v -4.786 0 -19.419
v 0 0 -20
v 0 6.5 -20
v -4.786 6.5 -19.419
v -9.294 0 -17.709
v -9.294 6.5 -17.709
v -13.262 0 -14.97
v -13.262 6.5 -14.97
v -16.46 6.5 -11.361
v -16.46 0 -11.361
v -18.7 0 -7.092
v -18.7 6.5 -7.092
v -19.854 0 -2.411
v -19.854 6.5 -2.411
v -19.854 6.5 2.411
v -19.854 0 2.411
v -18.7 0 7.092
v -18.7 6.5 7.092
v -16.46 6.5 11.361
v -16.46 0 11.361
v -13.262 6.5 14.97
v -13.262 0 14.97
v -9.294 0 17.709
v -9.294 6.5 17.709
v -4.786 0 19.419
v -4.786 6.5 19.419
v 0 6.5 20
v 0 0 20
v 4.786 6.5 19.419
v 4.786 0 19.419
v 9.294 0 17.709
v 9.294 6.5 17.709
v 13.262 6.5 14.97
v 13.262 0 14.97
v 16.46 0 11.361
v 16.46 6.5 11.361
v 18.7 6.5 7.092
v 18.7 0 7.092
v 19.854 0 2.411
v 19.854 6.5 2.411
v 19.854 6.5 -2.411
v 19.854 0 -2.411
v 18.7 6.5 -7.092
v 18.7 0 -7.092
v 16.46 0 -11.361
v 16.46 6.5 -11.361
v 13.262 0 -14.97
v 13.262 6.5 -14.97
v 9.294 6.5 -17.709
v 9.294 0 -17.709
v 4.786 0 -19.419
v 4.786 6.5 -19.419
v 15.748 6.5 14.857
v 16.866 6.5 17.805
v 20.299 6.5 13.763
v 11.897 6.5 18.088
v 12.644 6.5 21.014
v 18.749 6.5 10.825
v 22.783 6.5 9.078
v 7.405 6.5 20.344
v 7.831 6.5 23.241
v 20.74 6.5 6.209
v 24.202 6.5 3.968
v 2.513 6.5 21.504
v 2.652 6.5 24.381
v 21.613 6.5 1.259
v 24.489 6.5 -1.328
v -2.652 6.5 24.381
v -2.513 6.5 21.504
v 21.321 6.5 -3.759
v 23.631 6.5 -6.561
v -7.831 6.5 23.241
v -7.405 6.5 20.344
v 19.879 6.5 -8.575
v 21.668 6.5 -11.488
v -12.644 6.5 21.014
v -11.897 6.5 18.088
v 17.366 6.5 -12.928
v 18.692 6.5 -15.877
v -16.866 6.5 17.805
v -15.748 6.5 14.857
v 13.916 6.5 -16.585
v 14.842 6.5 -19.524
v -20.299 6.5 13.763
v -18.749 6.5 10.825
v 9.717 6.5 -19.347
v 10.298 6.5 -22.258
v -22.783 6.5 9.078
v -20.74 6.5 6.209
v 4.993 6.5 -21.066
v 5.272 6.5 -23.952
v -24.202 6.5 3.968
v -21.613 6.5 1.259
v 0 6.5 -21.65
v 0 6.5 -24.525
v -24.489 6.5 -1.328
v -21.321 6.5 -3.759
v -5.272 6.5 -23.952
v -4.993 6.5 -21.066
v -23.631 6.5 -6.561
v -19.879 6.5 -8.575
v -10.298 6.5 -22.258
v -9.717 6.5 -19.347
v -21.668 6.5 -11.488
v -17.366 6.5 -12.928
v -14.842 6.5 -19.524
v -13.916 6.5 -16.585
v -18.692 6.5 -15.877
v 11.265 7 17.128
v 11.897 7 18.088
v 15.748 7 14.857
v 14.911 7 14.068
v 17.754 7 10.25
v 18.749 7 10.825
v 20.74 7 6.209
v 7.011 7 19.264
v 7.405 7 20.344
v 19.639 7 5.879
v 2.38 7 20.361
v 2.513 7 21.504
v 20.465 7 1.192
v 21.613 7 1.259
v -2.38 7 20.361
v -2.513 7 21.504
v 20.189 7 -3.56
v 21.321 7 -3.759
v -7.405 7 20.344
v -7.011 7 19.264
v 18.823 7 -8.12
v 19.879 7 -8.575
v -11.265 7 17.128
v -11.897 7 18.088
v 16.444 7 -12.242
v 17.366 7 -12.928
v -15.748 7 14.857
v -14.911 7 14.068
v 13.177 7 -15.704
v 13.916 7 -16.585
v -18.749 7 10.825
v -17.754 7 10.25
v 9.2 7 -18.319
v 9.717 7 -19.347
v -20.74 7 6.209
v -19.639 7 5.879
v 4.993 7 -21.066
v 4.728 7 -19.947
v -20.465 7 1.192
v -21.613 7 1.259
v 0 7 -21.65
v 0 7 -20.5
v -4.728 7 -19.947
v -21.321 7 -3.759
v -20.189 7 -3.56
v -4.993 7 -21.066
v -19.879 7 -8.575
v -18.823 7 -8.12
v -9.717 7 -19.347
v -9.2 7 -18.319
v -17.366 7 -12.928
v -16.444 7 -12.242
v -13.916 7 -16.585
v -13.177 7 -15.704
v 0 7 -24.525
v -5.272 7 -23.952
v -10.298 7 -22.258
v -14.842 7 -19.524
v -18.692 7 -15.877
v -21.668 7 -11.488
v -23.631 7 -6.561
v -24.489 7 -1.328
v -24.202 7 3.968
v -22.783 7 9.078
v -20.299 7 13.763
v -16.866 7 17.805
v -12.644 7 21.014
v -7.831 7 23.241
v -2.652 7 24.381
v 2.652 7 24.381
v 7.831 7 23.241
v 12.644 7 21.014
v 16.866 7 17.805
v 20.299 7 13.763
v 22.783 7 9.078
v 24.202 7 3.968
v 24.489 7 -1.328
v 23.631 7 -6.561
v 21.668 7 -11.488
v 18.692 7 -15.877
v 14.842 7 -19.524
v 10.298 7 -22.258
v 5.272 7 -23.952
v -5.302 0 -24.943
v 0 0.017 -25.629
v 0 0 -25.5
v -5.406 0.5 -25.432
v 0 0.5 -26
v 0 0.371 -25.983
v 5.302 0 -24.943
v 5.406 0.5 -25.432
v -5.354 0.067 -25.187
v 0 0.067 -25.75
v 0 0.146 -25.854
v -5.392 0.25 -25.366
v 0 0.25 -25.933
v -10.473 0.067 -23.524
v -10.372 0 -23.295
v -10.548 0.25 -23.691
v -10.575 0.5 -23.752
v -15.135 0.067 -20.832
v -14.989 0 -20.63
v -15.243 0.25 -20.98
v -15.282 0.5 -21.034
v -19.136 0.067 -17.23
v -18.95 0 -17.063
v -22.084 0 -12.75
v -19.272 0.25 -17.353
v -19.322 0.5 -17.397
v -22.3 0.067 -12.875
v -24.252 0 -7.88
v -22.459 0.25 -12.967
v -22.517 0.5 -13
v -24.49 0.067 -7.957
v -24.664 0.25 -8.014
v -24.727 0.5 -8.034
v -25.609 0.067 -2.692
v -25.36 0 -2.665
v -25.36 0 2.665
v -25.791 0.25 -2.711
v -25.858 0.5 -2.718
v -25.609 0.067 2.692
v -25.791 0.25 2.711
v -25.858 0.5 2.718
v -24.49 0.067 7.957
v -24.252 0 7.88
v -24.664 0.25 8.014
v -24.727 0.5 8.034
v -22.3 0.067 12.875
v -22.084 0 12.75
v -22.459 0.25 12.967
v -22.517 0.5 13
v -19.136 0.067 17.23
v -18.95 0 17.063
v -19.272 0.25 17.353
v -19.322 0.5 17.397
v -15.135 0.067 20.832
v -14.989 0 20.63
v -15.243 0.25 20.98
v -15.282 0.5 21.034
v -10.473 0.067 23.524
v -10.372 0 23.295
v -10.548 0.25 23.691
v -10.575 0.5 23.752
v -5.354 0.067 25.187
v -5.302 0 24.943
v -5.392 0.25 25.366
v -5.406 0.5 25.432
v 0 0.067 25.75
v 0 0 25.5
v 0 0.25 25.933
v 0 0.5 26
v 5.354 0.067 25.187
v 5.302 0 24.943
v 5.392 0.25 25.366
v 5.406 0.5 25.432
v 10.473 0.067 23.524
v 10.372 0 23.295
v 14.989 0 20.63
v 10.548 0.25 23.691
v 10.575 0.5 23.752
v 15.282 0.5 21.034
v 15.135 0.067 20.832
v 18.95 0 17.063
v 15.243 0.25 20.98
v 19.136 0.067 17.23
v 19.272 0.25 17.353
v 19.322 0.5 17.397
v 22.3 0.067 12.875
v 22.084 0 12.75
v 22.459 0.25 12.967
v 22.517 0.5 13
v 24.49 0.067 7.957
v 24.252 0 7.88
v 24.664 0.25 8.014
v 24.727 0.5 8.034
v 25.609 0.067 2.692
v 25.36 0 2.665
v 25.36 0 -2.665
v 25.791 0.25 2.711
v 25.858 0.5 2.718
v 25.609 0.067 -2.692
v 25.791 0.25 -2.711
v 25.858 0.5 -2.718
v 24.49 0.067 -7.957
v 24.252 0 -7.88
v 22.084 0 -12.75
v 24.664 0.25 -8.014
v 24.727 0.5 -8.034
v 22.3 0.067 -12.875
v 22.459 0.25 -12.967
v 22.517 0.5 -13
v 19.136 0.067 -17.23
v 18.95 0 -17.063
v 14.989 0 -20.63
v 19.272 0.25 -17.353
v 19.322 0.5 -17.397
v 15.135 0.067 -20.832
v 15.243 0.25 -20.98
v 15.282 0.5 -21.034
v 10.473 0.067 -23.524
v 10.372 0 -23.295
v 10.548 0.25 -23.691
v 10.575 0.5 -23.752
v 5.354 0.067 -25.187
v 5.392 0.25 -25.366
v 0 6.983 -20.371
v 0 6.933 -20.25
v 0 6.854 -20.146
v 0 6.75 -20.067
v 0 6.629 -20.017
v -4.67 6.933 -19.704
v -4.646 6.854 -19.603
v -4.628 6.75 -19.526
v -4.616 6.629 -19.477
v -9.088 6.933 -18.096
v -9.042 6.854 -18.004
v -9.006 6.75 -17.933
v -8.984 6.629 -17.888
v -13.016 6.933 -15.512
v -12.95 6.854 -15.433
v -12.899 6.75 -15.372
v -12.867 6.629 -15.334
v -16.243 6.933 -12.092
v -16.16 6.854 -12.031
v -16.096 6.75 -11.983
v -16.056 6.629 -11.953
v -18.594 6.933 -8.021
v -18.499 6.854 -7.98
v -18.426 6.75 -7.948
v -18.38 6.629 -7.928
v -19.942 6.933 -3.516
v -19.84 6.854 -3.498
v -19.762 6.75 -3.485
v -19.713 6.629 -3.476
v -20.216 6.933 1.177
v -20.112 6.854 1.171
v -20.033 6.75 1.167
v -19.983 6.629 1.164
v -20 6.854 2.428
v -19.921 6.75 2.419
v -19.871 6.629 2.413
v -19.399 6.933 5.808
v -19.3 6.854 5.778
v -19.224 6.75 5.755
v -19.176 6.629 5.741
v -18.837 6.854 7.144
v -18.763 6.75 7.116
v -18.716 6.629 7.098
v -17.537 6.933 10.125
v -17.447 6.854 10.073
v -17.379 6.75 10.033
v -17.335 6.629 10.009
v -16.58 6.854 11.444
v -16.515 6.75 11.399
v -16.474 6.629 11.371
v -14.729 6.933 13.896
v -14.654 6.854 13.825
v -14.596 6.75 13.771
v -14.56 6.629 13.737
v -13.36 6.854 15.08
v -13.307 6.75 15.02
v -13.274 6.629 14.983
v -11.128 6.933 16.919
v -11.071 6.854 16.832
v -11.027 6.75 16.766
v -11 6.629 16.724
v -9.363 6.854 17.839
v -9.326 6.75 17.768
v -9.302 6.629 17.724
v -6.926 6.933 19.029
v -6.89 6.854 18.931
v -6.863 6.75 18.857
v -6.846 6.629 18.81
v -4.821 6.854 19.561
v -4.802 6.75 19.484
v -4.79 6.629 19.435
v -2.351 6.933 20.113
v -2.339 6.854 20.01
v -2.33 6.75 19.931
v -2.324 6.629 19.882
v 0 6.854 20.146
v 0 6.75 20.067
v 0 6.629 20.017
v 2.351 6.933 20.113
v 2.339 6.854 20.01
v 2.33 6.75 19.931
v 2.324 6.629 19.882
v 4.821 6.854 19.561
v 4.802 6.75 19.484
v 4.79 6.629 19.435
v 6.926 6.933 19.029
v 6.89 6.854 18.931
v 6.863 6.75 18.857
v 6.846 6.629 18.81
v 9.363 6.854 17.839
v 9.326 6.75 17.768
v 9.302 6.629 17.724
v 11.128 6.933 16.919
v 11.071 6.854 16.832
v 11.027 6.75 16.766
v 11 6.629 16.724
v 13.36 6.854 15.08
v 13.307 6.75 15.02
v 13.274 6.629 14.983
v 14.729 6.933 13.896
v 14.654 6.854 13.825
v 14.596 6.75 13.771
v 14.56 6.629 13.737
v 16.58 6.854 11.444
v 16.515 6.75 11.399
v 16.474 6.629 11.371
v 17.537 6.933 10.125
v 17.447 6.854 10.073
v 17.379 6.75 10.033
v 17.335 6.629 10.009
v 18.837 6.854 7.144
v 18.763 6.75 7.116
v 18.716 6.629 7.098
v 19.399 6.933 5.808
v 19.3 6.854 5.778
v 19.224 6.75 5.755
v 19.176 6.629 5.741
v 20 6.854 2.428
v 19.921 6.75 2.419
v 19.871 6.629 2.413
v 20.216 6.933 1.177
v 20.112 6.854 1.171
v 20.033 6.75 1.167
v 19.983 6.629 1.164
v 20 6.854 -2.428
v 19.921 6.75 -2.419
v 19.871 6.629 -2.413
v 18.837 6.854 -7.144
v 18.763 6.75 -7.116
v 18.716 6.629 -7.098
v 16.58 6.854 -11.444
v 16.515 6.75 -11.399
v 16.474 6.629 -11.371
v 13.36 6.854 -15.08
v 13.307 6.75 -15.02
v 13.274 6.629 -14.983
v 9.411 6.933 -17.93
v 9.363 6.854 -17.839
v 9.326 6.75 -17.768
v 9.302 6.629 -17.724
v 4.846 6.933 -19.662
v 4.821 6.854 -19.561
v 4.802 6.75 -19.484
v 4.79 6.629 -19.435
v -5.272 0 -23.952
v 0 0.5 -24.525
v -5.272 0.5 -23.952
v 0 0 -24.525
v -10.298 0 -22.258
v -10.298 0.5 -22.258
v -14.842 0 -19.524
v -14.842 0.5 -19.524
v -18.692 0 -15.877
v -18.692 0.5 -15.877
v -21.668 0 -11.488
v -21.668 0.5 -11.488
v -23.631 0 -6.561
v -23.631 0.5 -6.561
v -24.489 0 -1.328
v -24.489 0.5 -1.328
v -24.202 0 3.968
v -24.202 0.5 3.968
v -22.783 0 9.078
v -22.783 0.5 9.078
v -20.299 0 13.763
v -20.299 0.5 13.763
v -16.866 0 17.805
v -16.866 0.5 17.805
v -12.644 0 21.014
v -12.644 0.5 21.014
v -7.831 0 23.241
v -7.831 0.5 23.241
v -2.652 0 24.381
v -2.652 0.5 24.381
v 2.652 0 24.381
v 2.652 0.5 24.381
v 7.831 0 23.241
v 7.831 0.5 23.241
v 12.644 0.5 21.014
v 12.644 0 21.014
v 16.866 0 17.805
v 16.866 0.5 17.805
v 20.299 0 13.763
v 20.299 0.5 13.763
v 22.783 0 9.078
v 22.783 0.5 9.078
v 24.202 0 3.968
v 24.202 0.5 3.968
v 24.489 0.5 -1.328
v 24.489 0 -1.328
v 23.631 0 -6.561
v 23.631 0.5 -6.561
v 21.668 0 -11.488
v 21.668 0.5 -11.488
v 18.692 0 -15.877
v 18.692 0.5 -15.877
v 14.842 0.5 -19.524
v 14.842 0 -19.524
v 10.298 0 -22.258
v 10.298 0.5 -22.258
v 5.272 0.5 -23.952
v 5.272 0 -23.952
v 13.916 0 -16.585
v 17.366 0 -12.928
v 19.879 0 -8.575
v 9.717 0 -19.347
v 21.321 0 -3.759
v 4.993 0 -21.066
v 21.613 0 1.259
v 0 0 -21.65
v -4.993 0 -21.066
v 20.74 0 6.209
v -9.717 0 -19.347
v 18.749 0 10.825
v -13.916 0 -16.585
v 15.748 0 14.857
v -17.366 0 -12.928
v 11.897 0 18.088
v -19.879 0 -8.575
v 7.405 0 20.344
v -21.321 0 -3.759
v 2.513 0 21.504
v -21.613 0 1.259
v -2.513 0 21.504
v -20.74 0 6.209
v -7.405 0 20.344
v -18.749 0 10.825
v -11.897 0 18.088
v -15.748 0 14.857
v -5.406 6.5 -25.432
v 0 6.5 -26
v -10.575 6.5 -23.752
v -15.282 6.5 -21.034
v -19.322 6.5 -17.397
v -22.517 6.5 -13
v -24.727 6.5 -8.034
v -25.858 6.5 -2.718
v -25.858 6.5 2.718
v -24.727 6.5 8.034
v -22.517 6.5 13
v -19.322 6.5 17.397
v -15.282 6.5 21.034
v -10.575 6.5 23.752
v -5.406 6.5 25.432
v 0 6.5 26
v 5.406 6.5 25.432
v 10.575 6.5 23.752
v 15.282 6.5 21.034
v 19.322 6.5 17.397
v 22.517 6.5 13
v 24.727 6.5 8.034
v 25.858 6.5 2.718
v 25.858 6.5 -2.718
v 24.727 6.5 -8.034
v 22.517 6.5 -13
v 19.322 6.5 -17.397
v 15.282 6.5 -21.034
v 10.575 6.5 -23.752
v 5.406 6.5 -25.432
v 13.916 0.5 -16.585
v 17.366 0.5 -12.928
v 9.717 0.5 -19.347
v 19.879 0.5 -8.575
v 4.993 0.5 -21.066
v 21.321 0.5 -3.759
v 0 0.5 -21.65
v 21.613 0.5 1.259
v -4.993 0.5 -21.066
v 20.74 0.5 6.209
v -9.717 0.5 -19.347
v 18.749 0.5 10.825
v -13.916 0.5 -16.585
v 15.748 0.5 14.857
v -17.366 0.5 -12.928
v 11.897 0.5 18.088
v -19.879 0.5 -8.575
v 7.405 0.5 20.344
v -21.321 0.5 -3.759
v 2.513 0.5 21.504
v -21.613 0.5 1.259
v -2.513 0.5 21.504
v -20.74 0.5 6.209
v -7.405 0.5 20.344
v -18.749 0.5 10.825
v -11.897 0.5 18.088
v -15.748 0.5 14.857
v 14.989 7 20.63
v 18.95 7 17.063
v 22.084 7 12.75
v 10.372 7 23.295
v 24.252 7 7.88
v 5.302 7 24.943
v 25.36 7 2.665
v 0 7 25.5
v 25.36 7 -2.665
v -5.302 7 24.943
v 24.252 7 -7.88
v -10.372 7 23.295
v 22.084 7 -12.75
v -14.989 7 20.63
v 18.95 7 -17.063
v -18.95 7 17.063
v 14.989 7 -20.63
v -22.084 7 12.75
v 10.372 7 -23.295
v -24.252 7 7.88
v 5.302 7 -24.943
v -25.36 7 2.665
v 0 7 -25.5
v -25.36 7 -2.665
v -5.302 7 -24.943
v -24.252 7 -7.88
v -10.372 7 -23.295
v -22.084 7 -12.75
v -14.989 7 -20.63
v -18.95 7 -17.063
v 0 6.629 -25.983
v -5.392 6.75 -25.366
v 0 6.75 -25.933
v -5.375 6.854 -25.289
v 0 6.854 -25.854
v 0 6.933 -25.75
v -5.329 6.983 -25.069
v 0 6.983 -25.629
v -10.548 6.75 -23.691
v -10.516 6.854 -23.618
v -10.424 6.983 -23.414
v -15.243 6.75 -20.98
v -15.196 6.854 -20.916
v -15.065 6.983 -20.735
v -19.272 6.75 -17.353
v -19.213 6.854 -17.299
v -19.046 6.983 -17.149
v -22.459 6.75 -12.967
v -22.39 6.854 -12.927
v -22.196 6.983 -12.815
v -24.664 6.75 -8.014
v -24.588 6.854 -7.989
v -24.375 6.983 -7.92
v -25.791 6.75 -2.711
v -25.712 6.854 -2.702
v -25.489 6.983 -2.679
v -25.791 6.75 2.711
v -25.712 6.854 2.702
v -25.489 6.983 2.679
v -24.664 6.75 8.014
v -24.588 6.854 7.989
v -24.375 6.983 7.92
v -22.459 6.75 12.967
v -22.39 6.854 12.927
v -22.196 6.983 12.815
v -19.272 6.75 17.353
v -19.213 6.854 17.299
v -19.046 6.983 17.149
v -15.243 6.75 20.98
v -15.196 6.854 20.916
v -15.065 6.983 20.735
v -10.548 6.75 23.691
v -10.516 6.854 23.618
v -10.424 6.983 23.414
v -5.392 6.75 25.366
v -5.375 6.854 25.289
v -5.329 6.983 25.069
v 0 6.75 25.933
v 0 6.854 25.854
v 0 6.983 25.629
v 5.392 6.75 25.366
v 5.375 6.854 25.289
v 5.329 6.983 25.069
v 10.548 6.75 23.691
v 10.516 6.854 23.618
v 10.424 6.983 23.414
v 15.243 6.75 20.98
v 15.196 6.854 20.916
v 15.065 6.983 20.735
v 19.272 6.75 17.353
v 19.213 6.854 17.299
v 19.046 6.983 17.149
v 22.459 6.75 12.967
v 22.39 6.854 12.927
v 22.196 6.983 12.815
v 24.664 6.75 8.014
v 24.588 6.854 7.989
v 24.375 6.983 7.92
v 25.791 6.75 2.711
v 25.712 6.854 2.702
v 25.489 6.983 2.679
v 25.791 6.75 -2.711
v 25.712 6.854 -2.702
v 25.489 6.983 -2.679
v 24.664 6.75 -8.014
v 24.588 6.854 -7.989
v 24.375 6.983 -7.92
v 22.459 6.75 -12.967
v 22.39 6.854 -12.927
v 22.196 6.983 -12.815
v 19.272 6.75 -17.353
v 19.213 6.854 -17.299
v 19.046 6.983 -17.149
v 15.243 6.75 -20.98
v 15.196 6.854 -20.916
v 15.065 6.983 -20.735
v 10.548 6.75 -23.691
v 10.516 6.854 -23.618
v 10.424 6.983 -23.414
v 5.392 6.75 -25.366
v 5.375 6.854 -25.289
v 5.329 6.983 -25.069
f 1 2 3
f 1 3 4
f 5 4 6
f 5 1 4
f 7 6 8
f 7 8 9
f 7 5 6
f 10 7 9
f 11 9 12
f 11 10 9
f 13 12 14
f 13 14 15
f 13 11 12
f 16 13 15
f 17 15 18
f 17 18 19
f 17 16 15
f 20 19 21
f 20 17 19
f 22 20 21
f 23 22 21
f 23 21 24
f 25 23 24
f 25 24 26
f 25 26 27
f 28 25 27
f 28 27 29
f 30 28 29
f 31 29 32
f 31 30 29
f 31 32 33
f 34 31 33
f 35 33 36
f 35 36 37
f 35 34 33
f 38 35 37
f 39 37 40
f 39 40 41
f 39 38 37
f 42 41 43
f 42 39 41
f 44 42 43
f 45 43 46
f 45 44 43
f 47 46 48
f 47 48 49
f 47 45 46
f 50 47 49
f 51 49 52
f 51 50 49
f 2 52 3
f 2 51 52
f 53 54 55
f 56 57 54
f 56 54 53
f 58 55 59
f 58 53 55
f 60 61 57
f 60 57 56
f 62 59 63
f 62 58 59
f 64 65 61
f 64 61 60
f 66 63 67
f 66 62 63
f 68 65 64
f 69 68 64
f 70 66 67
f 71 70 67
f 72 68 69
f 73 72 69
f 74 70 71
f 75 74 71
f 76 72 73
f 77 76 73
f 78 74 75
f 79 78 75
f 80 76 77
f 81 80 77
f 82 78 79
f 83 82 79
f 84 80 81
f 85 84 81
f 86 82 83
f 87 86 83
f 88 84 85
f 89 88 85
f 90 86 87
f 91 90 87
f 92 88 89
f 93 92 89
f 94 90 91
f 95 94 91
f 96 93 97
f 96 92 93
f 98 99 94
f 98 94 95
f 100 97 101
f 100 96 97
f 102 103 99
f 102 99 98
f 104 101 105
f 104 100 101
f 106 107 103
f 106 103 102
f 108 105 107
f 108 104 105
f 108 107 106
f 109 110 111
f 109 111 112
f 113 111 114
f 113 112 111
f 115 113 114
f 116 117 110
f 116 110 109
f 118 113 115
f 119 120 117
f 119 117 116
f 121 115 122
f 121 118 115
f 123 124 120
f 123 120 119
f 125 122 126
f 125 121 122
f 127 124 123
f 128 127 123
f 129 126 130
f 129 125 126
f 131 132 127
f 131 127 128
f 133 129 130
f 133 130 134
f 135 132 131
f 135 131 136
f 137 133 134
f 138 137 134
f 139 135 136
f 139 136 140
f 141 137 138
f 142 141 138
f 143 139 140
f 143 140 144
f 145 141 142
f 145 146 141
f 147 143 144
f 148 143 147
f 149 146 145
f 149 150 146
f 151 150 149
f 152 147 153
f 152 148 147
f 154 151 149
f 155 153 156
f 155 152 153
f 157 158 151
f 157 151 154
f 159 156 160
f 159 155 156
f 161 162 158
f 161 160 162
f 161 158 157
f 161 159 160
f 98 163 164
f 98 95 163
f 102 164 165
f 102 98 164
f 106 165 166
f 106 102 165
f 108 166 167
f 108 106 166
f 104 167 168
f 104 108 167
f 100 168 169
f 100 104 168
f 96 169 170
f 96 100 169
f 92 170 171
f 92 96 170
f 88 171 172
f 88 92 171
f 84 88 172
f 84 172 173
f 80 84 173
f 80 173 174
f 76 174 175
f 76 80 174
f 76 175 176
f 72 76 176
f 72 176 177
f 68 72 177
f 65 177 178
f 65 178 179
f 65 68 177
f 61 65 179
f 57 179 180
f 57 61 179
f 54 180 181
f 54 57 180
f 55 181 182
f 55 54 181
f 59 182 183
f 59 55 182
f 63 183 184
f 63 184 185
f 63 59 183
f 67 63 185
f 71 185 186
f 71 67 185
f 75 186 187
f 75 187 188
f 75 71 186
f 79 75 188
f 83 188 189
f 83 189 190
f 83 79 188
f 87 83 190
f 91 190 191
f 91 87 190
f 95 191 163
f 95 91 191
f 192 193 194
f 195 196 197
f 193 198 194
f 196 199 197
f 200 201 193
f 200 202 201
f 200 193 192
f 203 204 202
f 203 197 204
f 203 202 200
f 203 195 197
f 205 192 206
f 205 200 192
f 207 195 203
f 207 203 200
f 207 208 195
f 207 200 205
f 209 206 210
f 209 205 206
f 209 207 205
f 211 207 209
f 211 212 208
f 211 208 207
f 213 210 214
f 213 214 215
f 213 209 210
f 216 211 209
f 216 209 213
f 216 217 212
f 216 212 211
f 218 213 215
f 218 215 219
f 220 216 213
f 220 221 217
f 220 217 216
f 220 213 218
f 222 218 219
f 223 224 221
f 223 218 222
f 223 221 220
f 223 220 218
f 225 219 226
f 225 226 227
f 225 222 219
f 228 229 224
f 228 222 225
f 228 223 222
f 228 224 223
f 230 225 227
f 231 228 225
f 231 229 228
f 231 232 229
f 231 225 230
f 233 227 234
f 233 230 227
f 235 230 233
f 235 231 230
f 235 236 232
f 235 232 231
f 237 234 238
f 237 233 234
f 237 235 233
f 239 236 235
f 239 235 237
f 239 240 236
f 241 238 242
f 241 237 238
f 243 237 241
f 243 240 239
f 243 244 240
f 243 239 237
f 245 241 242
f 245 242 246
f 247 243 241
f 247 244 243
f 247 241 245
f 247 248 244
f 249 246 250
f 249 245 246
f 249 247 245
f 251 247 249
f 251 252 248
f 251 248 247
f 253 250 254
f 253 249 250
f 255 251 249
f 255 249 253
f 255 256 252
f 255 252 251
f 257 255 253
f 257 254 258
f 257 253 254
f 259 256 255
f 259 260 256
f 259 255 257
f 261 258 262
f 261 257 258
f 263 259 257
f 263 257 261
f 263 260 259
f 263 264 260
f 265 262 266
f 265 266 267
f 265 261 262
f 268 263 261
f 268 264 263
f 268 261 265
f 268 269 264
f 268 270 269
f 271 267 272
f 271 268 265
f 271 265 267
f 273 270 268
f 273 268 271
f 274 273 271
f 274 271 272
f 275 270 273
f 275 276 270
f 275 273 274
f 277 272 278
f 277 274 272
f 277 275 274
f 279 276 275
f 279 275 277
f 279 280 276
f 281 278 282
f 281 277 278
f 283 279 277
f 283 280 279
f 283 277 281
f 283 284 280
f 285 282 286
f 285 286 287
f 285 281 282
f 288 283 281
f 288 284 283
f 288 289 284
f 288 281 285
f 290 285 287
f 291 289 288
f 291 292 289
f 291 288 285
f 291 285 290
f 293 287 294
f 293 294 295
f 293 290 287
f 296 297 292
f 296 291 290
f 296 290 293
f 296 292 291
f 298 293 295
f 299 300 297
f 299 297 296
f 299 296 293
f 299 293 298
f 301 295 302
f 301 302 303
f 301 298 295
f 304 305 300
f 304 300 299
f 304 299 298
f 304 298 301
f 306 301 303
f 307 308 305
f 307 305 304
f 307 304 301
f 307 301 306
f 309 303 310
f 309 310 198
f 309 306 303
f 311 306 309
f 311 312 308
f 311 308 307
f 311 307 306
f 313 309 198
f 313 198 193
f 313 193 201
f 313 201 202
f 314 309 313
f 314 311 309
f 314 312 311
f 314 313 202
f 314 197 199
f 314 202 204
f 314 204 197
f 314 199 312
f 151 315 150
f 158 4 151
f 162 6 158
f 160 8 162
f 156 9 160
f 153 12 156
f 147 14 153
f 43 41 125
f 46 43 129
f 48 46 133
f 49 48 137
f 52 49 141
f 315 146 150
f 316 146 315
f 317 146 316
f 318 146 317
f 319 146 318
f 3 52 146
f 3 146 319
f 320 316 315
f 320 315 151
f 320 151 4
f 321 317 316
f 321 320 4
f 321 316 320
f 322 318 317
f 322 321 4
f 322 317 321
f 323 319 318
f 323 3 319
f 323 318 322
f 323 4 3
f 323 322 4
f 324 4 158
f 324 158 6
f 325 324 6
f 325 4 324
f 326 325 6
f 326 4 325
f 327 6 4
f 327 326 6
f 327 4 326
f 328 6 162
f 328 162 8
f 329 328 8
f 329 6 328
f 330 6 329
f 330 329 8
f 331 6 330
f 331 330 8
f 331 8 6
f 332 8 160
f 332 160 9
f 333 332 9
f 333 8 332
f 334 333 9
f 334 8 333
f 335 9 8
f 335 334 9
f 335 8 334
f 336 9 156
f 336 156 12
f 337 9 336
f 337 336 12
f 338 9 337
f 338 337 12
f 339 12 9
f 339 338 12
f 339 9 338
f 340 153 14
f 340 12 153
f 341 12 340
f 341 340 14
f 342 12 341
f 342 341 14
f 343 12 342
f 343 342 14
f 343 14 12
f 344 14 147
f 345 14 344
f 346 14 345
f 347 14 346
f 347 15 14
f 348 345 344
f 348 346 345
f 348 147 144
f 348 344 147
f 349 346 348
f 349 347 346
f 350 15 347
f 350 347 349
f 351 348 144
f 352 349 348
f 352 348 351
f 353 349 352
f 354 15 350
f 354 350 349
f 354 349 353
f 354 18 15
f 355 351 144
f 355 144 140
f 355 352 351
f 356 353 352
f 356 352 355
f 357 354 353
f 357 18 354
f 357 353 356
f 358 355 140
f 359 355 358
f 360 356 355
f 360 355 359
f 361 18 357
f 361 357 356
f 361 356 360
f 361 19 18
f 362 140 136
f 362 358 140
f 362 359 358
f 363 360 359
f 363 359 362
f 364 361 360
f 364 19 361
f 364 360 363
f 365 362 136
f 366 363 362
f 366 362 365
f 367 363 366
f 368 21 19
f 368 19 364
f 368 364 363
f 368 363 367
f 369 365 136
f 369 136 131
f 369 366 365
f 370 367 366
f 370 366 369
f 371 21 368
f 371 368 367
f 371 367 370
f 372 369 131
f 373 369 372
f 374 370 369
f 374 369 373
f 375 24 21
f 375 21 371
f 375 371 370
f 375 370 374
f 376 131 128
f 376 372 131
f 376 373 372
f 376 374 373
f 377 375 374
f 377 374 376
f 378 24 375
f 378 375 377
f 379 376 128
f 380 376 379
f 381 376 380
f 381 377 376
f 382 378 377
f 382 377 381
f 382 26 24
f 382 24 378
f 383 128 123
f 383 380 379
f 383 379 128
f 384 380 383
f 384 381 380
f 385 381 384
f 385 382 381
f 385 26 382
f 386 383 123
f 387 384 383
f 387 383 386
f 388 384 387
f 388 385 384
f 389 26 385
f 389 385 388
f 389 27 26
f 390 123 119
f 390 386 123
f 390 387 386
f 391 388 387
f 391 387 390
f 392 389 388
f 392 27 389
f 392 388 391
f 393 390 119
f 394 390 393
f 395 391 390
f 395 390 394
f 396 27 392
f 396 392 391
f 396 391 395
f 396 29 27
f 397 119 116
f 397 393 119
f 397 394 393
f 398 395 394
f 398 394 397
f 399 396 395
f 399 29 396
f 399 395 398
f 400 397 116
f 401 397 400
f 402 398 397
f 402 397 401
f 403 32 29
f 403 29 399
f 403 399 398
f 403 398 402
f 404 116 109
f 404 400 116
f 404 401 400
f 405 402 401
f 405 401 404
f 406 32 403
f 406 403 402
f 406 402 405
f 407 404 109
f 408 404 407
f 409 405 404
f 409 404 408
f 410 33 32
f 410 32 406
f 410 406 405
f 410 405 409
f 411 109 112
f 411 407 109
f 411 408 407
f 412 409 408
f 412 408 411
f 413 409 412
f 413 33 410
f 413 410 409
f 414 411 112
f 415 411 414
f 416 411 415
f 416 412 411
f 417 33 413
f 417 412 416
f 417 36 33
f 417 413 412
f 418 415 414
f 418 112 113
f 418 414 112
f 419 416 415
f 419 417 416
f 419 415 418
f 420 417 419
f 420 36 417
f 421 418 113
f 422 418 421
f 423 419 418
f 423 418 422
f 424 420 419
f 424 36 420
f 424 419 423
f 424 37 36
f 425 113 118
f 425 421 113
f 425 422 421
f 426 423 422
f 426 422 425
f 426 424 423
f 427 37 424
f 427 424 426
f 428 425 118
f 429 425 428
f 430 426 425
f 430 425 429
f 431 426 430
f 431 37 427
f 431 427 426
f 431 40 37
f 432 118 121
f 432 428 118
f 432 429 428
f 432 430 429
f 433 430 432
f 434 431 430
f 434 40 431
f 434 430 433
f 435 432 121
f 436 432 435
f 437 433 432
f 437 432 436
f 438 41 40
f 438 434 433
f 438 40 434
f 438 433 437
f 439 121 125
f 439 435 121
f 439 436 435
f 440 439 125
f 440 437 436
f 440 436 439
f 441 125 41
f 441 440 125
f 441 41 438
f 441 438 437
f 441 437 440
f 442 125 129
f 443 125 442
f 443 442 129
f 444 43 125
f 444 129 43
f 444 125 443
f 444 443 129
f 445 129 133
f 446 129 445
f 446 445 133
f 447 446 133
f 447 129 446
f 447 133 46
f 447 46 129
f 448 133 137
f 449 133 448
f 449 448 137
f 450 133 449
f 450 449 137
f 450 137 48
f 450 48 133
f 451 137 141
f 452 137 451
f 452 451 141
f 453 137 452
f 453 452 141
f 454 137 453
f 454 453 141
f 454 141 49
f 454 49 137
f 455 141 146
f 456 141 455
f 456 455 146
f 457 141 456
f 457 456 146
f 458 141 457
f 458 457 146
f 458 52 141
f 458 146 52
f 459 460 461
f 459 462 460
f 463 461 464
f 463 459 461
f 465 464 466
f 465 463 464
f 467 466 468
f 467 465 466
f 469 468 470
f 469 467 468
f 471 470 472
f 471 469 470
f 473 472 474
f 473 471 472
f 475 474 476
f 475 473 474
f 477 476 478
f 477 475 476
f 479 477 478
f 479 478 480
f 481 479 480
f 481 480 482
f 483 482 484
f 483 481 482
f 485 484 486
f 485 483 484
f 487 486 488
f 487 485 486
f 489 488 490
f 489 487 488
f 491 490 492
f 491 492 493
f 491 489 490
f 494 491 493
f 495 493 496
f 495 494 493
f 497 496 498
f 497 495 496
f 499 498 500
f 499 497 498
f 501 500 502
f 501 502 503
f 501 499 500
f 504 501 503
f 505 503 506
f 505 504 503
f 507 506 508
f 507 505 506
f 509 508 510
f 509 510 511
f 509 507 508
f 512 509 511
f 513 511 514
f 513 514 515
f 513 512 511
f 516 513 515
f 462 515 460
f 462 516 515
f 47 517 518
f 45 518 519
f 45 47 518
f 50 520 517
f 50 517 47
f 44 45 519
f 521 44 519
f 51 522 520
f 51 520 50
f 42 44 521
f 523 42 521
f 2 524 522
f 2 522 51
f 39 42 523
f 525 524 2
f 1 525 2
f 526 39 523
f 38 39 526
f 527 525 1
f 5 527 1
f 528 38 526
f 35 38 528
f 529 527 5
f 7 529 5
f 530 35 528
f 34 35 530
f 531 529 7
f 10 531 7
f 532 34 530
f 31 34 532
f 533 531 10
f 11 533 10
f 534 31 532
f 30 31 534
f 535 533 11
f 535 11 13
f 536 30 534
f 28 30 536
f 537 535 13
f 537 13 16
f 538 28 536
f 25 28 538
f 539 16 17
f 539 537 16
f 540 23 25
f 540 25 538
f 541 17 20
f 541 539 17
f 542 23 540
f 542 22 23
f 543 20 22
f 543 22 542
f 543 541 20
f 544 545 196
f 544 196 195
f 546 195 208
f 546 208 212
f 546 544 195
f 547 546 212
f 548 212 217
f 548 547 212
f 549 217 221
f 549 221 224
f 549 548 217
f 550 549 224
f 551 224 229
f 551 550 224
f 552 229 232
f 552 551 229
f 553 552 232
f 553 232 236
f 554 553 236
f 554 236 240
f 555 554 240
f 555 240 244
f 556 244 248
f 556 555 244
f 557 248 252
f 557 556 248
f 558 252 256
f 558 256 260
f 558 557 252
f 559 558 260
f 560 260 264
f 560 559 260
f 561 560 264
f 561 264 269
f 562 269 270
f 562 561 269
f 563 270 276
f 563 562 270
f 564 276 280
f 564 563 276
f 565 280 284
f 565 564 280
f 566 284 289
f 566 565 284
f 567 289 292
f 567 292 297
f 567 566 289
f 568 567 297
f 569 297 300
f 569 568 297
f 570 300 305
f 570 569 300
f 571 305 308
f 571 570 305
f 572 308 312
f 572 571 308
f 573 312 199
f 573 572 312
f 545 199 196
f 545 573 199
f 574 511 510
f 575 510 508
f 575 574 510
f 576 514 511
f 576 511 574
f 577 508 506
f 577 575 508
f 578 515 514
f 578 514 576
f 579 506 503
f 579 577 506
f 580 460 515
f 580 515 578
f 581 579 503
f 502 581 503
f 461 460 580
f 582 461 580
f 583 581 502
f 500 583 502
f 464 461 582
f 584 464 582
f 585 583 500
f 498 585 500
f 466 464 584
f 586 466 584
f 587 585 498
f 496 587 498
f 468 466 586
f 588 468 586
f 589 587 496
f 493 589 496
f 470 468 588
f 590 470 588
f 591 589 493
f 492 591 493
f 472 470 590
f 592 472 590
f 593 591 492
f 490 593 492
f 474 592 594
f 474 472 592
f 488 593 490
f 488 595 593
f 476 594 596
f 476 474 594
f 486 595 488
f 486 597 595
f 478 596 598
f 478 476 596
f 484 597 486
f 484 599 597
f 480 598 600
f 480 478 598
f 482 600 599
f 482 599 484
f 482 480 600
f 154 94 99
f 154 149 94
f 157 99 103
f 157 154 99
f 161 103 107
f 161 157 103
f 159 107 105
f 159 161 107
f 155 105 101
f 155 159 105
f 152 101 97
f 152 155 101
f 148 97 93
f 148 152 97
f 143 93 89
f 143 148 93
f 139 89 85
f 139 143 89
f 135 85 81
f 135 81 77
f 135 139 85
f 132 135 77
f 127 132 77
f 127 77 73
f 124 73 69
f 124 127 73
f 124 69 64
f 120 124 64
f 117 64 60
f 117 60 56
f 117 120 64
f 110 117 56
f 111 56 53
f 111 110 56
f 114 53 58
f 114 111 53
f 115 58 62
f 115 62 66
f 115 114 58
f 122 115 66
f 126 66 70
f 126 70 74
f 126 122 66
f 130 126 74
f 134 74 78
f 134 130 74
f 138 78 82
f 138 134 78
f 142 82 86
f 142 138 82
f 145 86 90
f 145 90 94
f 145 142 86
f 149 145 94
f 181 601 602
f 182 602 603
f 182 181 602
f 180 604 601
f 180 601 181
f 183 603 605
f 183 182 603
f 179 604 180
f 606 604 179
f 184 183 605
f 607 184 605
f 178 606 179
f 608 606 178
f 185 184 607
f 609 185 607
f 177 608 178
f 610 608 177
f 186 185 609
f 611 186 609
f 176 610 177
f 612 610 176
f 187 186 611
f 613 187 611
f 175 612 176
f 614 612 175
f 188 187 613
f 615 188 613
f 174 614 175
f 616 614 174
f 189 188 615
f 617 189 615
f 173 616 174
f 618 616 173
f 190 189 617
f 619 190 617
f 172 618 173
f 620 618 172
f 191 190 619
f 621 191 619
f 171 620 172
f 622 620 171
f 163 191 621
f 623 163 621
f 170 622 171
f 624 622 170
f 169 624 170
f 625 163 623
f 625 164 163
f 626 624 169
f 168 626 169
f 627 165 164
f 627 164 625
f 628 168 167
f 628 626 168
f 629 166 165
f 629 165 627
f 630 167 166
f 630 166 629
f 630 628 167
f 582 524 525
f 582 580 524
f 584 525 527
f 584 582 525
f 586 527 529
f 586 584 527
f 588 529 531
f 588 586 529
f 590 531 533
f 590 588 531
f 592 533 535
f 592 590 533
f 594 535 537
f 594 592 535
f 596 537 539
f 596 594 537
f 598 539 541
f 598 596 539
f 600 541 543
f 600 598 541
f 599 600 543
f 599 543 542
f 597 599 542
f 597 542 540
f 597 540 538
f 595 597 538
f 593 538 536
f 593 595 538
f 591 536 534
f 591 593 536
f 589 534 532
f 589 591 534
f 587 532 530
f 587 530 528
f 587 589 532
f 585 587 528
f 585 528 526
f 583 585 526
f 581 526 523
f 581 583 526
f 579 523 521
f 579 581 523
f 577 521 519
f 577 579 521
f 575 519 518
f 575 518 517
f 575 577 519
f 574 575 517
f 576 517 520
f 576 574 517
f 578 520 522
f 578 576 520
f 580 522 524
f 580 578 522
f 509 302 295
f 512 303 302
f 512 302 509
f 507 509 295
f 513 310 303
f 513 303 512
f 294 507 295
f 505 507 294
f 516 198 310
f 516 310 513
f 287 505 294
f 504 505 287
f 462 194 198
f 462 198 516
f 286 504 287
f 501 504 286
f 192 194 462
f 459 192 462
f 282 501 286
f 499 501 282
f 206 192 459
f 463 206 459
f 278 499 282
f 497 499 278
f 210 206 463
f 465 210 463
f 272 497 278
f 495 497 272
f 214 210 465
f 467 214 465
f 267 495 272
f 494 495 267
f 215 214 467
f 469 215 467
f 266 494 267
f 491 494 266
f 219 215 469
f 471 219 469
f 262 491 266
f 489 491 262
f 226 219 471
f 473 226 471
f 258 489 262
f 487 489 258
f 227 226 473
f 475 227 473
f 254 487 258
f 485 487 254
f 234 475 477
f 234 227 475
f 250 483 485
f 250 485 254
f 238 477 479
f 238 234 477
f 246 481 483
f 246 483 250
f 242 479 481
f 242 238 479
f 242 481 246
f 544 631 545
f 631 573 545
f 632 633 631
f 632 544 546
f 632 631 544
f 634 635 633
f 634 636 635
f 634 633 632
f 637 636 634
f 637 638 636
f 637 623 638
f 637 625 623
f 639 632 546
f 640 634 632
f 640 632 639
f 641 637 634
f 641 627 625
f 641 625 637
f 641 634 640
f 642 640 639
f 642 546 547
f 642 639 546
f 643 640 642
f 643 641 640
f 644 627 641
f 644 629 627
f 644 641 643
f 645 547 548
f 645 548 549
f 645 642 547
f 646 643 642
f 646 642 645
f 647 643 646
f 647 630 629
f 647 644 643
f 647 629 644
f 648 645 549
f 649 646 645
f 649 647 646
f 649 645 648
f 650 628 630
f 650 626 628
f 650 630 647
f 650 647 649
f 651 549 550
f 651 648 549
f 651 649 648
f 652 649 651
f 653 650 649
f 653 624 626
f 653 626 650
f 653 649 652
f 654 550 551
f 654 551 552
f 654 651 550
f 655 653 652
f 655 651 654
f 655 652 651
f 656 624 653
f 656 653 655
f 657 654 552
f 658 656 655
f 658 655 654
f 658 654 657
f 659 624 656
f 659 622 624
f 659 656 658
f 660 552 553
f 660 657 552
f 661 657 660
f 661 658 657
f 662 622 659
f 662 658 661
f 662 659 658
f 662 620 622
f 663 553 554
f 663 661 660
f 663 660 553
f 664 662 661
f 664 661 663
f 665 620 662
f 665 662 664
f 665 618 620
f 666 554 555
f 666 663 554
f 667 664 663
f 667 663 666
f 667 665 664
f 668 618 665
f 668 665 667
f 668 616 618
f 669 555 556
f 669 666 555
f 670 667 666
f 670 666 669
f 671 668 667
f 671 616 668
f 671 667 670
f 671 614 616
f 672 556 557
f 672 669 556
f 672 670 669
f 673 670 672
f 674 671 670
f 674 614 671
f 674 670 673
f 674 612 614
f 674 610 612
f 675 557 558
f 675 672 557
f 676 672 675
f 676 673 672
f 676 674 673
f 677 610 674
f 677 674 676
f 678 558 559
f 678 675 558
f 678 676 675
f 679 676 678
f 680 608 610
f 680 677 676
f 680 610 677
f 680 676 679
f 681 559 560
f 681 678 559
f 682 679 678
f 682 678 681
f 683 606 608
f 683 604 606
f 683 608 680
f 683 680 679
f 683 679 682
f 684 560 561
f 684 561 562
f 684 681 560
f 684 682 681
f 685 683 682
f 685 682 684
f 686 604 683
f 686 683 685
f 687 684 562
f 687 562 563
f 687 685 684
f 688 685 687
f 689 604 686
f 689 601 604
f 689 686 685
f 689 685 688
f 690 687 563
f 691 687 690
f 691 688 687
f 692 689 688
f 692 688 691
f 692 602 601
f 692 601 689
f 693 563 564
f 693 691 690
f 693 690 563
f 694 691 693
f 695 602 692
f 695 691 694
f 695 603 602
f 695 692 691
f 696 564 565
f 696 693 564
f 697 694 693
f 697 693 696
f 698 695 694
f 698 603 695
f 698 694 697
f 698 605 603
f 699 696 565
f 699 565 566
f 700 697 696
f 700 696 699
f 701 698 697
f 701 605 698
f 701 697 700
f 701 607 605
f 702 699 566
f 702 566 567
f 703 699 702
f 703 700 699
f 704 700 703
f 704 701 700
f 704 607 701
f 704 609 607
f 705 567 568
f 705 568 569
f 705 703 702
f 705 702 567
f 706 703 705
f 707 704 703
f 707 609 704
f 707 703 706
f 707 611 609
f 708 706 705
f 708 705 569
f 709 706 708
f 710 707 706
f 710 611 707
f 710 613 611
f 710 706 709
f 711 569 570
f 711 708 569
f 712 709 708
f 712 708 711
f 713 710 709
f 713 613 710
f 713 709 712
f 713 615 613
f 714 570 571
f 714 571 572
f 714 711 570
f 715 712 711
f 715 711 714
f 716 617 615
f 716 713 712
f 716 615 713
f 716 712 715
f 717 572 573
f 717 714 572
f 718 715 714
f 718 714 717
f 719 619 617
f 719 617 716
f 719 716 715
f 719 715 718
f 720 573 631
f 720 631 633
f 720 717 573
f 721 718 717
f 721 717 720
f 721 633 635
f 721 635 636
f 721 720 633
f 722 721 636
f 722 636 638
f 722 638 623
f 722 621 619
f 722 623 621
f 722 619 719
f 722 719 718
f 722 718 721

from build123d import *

# Parameters (mm, degrees)
VERRUNDUNG1_R = 0.5


with BuildPart() as part:
    # Skizze1 → Rotation1 (revolve)
    with BuildSketch(Plane.XY, mode=Mode.PRIVATE) as rotation1_sk:
        Polygon((20, 0), (21.65, 0), (21.65, 0.5), (24.525, 0.5), (24.525, 0), (26, 0), (26, 7), (24.525, 7), (24.525, 6.5), (21.65, 6.5), (21.65, 7), (20, 7), align=None)
    revolve(rotation1_sk.sketch.rotate(Axis((0, 0, 0), (0, 1, 0)), 90), axis=Axis((0, 0, 0), (0, 1, 0)))

    # Verrundung1
    verrundung1_edges = [part.edges().sort_by_distance(p)[0] for p in [
        (0, 7, 26),
        (0, 0, 26),
        (0, 7, 20),
    ]]
    fillet(verrundung1_edges, radius=VERRUNDUNG1_R)


solid = part.part
